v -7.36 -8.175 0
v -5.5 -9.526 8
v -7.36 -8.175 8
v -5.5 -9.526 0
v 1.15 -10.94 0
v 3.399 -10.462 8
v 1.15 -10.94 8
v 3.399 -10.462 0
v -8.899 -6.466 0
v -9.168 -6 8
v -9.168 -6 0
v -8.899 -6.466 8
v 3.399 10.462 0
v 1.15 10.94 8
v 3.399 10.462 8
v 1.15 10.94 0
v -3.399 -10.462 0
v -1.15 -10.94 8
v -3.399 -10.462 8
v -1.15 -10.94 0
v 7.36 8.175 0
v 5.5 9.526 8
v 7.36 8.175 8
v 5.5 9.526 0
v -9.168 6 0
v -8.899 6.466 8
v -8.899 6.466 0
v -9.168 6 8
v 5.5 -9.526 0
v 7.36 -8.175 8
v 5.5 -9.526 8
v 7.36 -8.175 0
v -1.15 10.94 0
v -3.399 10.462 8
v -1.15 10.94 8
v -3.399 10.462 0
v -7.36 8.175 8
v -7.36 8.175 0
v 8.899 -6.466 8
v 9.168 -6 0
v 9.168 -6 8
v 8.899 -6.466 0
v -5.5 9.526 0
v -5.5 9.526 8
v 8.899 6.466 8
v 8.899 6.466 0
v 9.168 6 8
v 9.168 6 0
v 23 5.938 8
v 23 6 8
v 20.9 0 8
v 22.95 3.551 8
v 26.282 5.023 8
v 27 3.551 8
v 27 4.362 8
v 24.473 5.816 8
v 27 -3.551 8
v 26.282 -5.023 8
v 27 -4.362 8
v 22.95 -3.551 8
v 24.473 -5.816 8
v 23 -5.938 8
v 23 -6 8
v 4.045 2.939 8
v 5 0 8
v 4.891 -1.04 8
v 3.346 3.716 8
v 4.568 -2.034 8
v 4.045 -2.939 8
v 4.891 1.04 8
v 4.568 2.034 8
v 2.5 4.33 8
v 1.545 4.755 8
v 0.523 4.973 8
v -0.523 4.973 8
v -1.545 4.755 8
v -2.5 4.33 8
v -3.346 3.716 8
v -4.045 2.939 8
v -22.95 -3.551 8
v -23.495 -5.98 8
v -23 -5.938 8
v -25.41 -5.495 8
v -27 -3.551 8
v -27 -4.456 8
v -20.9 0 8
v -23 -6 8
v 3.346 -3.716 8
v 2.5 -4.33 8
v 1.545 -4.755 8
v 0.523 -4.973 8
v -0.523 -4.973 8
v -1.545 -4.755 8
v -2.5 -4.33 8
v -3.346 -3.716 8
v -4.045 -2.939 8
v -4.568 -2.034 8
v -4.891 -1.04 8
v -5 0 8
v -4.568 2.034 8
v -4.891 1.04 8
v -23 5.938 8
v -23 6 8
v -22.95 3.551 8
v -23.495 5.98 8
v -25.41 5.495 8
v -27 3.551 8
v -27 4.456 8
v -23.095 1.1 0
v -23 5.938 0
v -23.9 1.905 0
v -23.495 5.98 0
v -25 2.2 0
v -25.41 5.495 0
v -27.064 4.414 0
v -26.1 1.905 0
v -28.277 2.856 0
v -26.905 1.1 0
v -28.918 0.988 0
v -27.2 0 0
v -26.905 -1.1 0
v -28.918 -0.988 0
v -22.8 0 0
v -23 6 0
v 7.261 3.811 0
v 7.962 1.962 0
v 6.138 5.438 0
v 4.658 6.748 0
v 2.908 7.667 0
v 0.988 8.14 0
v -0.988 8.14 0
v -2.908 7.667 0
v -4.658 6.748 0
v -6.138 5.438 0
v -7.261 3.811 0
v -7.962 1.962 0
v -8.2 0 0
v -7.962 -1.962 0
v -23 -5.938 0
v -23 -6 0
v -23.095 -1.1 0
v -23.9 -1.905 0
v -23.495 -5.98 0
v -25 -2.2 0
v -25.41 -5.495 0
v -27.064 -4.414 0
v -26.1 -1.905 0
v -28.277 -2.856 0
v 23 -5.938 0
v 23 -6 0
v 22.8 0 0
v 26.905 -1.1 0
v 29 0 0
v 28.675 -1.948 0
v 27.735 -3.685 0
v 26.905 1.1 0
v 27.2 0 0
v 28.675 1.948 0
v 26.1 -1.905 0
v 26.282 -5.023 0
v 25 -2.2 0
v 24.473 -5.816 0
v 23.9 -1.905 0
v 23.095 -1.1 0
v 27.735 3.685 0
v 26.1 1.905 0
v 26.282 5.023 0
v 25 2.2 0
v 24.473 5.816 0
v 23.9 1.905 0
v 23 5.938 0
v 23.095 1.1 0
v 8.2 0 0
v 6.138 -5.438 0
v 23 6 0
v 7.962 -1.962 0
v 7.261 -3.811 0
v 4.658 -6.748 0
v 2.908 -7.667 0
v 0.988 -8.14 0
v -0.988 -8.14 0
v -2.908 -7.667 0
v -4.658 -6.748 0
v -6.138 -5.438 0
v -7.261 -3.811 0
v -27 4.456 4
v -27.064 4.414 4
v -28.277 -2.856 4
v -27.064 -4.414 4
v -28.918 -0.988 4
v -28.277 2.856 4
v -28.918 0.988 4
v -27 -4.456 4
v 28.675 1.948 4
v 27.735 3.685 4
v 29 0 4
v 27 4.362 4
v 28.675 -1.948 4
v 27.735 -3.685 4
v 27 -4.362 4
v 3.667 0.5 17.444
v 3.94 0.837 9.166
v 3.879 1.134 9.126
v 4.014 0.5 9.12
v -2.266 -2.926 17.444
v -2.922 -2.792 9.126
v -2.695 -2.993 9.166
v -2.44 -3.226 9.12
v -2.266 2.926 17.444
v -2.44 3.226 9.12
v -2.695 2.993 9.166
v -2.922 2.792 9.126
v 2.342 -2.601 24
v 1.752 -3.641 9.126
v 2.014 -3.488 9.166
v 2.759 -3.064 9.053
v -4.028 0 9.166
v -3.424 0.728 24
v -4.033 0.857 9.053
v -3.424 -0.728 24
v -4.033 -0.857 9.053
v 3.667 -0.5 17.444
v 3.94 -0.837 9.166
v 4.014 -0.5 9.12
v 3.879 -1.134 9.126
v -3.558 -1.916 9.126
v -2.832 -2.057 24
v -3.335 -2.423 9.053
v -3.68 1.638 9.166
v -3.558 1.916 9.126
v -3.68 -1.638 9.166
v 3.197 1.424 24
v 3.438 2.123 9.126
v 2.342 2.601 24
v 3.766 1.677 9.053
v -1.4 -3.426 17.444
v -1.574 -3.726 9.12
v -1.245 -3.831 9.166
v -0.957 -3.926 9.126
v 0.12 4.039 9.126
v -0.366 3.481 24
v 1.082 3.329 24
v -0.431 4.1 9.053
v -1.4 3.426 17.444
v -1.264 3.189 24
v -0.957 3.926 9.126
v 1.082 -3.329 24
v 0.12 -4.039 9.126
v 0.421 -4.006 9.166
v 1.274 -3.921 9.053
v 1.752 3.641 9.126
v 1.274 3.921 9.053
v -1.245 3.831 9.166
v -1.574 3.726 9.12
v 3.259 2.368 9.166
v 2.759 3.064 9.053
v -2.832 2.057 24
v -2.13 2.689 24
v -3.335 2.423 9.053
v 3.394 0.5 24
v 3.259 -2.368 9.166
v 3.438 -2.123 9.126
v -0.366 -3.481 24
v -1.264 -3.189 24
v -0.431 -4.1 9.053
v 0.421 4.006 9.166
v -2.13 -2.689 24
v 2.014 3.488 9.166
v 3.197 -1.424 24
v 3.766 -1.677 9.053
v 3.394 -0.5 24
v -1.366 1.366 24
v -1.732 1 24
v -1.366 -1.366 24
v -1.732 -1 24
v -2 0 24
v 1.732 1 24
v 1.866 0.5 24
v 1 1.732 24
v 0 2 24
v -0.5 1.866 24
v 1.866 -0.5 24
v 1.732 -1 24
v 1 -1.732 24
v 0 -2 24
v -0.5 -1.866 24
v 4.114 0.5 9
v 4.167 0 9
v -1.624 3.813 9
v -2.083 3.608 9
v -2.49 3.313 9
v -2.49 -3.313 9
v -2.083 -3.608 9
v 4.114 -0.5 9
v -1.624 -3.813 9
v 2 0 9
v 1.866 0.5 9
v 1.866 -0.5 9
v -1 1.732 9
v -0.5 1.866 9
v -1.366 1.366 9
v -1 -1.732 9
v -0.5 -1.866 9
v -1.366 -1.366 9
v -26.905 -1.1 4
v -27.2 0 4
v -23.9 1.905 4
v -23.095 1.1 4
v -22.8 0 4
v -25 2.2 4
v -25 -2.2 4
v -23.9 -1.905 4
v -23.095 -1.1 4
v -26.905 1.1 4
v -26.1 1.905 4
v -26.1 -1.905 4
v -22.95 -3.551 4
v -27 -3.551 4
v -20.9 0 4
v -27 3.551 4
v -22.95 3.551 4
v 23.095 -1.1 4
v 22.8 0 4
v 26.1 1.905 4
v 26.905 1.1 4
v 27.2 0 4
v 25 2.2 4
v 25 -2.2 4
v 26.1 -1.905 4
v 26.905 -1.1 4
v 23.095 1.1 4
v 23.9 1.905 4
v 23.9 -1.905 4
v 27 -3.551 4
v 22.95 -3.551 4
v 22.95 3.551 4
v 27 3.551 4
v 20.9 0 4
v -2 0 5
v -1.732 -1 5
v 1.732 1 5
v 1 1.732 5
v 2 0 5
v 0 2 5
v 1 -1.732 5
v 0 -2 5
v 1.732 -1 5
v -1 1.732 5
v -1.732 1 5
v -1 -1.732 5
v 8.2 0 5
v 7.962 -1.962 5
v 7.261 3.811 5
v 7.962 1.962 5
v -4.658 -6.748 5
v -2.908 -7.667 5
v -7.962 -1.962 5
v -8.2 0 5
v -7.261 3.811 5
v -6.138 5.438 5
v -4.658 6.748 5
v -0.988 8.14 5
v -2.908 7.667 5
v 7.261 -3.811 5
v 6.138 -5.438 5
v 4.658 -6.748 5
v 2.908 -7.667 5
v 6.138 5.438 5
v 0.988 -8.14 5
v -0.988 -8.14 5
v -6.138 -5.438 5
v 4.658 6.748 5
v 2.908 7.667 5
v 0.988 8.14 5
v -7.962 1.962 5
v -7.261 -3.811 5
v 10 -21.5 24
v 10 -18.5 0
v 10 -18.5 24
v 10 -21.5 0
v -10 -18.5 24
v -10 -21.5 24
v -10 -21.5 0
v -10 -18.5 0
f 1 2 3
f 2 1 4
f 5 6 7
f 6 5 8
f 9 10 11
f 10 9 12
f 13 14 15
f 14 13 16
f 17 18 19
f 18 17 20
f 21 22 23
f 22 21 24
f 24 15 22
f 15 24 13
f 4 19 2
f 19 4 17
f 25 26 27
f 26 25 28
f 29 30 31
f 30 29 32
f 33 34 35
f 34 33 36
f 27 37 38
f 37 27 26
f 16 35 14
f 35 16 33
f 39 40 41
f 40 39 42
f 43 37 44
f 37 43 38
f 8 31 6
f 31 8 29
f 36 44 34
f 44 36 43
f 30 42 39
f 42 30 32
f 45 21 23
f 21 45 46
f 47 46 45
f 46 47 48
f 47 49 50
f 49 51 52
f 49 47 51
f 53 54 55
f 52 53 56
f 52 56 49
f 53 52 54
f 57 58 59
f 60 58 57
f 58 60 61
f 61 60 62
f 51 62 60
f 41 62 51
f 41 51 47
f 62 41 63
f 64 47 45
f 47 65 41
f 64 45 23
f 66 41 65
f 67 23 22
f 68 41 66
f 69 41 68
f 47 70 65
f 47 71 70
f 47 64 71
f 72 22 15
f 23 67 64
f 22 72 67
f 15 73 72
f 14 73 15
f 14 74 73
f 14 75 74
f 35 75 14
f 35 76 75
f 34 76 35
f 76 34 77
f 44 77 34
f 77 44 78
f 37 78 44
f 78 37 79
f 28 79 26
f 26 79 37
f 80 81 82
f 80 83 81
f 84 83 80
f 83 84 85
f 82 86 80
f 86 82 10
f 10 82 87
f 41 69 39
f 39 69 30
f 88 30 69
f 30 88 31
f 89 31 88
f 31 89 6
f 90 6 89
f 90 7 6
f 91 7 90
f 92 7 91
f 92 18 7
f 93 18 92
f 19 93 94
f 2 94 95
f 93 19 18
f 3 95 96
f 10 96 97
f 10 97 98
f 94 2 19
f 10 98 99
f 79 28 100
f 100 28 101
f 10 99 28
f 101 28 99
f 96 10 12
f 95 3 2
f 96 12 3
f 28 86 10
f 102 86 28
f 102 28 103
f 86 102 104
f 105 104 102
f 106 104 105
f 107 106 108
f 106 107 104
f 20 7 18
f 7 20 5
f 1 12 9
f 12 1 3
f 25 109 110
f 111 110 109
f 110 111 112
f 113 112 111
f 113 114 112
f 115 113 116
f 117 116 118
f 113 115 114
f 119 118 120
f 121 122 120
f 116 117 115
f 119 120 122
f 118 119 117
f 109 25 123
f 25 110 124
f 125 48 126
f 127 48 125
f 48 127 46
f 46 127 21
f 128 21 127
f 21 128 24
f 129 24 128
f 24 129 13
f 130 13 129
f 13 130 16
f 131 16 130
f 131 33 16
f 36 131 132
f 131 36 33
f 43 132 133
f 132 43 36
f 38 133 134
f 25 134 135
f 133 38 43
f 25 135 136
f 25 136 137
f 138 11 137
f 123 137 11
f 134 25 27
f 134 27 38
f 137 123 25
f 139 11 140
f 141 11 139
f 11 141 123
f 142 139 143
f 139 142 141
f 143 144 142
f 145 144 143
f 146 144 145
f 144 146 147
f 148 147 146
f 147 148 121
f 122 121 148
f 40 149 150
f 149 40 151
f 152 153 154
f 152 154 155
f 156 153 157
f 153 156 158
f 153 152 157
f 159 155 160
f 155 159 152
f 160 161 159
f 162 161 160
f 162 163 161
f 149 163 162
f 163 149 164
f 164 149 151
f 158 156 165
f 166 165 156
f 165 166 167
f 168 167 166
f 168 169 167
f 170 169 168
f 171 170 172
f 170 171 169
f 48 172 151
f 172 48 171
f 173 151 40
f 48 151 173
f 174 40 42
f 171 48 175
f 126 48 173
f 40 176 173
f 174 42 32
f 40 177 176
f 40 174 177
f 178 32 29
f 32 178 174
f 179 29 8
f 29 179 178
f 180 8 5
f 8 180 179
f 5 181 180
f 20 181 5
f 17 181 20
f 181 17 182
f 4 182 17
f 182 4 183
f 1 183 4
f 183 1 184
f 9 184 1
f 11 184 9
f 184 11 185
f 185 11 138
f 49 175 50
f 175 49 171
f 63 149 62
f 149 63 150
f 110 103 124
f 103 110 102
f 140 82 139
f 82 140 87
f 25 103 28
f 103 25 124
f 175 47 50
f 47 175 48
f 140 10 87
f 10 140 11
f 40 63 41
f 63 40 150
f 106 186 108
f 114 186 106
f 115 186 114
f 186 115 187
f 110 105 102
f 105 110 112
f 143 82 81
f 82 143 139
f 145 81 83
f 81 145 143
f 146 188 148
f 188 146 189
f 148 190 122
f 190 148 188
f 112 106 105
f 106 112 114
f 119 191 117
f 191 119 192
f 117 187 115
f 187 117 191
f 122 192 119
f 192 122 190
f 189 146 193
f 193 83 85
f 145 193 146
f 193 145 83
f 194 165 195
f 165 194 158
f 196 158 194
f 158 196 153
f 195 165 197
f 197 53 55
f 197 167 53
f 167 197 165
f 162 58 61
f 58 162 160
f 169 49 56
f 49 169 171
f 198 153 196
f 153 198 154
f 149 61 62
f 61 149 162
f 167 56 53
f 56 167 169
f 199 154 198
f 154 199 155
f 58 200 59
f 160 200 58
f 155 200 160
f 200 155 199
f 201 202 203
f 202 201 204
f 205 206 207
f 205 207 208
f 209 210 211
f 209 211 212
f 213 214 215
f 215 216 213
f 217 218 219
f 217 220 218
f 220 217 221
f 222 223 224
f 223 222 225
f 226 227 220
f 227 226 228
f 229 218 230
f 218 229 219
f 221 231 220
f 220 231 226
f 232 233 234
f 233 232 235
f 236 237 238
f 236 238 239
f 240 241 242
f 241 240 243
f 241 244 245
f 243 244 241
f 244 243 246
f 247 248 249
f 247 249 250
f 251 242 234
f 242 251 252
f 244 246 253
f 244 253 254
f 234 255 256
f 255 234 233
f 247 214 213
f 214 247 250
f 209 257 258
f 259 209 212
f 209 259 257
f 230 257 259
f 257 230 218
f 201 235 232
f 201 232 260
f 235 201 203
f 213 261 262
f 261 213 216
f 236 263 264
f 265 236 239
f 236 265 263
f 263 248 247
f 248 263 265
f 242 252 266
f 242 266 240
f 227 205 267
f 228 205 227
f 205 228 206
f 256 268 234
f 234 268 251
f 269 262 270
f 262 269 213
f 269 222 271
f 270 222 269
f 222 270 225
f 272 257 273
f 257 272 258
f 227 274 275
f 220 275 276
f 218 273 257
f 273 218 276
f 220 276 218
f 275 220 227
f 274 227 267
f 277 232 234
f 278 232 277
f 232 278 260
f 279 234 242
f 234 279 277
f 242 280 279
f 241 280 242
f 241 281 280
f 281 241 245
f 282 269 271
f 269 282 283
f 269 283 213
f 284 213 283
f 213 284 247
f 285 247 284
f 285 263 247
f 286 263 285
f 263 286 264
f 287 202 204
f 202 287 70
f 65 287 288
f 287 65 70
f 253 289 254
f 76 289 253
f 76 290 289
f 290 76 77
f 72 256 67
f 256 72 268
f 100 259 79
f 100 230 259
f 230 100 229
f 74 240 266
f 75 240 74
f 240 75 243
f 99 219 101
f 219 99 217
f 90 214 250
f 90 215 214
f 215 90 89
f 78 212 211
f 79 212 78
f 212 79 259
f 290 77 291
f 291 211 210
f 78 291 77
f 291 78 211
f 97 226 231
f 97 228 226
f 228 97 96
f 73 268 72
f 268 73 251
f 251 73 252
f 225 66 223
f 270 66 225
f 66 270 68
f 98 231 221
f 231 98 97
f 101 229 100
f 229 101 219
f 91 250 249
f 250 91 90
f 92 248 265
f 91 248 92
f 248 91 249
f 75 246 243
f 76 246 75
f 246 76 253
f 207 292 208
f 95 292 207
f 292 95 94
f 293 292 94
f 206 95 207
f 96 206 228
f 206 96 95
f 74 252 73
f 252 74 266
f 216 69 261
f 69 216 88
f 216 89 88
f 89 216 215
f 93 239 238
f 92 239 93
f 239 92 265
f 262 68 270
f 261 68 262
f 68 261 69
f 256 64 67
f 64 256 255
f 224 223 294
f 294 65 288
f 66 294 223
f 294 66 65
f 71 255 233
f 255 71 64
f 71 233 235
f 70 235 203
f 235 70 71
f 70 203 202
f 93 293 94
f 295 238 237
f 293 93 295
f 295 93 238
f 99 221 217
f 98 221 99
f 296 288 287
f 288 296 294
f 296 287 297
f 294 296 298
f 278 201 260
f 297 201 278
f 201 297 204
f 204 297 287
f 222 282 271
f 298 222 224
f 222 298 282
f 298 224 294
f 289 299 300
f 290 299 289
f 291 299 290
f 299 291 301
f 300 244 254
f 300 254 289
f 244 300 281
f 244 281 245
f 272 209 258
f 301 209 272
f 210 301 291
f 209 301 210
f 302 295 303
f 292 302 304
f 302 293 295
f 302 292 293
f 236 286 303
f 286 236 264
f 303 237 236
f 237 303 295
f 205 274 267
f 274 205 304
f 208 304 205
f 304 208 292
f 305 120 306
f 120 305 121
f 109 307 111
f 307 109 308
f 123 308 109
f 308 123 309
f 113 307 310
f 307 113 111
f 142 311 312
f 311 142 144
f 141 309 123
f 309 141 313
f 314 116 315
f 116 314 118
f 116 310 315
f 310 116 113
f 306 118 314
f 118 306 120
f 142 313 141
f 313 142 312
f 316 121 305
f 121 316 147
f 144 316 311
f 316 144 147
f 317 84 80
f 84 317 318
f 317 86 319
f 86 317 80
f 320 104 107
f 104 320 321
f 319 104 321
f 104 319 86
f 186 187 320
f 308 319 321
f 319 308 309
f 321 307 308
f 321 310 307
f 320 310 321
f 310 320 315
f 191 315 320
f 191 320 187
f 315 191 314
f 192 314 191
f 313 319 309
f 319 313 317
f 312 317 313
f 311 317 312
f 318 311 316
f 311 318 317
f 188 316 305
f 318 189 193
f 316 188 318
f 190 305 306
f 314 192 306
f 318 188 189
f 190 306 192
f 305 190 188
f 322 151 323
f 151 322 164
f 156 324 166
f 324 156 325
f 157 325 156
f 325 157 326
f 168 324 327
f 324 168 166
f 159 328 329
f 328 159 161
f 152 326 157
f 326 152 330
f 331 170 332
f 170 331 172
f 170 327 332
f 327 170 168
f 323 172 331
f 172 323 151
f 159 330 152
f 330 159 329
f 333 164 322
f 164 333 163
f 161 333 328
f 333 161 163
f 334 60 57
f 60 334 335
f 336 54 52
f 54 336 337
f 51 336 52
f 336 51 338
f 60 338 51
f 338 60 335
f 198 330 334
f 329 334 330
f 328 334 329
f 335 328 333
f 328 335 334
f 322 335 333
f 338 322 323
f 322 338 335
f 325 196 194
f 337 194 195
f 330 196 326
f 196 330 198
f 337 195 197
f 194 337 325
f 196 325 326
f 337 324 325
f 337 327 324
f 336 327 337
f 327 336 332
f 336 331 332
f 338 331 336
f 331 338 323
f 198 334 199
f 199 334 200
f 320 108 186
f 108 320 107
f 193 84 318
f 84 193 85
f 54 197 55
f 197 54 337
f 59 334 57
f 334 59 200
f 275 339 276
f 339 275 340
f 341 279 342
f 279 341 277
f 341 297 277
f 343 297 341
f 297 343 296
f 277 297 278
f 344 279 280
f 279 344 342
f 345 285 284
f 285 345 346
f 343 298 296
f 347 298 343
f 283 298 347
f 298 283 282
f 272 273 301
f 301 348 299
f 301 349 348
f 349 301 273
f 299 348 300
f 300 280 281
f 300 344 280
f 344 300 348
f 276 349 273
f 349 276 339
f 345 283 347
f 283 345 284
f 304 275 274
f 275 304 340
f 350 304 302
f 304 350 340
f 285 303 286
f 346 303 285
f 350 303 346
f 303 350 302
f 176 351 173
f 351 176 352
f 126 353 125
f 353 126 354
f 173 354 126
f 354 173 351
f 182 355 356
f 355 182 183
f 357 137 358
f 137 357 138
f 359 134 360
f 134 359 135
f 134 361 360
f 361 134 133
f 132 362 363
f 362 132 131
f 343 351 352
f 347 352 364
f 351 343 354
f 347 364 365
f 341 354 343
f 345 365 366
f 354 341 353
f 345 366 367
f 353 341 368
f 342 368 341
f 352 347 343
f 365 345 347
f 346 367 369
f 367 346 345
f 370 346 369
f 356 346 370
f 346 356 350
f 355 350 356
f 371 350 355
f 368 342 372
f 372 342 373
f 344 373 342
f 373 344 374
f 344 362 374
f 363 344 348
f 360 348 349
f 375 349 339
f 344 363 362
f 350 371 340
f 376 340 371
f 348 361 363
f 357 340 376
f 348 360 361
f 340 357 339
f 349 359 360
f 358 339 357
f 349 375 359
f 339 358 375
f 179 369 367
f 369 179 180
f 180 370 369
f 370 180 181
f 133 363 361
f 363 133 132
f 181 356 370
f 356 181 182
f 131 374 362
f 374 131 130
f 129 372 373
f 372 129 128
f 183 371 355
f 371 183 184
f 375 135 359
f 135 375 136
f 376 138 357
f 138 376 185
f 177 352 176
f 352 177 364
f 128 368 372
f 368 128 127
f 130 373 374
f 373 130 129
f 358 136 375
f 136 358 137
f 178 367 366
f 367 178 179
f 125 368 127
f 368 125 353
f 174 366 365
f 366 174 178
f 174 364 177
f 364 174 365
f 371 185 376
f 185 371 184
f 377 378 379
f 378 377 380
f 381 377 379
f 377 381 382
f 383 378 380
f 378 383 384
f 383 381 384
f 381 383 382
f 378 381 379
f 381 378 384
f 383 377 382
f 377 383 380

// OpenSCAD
module clamp(h, base){
  difference(){
    union() {
      // Clamp cone for M8 nut.
      cylinder(r1=4.5, r2=3.5, h=h);
      // Gradual cone base.
      translate([0, 0, base]) cylinder(r1=10, r2=0, h=12, center=true);
      // Base middle.
      translate([0, 0, base/2]) {
	cylinder(r=11, h=base, center=true);
	cube([46, 12, base], center=true);
      }
      // Shoulders around screw holes.
      for (x = [-23, 23]) {
	translate([x, 0, base/2]) cylinder(r=6, h=base, center=true);
      }
    }
    // Bowden cable through hole.
    cylinder(r=2, h=30, $fn=12);
    // Three sided cutout.
    for (a = [0:120:359]) {
      rotate([0, 0, a]) translate([3, 0, base+1+h/2])
	cube([5, 1, h], center=true);
    }
    // Holder for PEEK insulator (e.g. MakerGear GrooveMount).
    cylinder(r=8.2, h=10, center=true);
    // Nut traps and screw holes.
    for (x = [-25, 25]) {
      translate([x, 0, base/2]) {
	cylinder(r = 2.2, h=base+1, center=true, $fn=12);
	rotate([0, 0, 0]) cylinder(r=4.1, h=base, $fn=6);
      }
      translate([x*1.2, 0, base]) cube([6, 20, base], center=true);
    }
  }
}

height = 24;
clamp(height, 8);

// Increase cooling time per layer for the thin riser.
translate([0, -20, height/2]) cube([20, 3, height], center=true);
